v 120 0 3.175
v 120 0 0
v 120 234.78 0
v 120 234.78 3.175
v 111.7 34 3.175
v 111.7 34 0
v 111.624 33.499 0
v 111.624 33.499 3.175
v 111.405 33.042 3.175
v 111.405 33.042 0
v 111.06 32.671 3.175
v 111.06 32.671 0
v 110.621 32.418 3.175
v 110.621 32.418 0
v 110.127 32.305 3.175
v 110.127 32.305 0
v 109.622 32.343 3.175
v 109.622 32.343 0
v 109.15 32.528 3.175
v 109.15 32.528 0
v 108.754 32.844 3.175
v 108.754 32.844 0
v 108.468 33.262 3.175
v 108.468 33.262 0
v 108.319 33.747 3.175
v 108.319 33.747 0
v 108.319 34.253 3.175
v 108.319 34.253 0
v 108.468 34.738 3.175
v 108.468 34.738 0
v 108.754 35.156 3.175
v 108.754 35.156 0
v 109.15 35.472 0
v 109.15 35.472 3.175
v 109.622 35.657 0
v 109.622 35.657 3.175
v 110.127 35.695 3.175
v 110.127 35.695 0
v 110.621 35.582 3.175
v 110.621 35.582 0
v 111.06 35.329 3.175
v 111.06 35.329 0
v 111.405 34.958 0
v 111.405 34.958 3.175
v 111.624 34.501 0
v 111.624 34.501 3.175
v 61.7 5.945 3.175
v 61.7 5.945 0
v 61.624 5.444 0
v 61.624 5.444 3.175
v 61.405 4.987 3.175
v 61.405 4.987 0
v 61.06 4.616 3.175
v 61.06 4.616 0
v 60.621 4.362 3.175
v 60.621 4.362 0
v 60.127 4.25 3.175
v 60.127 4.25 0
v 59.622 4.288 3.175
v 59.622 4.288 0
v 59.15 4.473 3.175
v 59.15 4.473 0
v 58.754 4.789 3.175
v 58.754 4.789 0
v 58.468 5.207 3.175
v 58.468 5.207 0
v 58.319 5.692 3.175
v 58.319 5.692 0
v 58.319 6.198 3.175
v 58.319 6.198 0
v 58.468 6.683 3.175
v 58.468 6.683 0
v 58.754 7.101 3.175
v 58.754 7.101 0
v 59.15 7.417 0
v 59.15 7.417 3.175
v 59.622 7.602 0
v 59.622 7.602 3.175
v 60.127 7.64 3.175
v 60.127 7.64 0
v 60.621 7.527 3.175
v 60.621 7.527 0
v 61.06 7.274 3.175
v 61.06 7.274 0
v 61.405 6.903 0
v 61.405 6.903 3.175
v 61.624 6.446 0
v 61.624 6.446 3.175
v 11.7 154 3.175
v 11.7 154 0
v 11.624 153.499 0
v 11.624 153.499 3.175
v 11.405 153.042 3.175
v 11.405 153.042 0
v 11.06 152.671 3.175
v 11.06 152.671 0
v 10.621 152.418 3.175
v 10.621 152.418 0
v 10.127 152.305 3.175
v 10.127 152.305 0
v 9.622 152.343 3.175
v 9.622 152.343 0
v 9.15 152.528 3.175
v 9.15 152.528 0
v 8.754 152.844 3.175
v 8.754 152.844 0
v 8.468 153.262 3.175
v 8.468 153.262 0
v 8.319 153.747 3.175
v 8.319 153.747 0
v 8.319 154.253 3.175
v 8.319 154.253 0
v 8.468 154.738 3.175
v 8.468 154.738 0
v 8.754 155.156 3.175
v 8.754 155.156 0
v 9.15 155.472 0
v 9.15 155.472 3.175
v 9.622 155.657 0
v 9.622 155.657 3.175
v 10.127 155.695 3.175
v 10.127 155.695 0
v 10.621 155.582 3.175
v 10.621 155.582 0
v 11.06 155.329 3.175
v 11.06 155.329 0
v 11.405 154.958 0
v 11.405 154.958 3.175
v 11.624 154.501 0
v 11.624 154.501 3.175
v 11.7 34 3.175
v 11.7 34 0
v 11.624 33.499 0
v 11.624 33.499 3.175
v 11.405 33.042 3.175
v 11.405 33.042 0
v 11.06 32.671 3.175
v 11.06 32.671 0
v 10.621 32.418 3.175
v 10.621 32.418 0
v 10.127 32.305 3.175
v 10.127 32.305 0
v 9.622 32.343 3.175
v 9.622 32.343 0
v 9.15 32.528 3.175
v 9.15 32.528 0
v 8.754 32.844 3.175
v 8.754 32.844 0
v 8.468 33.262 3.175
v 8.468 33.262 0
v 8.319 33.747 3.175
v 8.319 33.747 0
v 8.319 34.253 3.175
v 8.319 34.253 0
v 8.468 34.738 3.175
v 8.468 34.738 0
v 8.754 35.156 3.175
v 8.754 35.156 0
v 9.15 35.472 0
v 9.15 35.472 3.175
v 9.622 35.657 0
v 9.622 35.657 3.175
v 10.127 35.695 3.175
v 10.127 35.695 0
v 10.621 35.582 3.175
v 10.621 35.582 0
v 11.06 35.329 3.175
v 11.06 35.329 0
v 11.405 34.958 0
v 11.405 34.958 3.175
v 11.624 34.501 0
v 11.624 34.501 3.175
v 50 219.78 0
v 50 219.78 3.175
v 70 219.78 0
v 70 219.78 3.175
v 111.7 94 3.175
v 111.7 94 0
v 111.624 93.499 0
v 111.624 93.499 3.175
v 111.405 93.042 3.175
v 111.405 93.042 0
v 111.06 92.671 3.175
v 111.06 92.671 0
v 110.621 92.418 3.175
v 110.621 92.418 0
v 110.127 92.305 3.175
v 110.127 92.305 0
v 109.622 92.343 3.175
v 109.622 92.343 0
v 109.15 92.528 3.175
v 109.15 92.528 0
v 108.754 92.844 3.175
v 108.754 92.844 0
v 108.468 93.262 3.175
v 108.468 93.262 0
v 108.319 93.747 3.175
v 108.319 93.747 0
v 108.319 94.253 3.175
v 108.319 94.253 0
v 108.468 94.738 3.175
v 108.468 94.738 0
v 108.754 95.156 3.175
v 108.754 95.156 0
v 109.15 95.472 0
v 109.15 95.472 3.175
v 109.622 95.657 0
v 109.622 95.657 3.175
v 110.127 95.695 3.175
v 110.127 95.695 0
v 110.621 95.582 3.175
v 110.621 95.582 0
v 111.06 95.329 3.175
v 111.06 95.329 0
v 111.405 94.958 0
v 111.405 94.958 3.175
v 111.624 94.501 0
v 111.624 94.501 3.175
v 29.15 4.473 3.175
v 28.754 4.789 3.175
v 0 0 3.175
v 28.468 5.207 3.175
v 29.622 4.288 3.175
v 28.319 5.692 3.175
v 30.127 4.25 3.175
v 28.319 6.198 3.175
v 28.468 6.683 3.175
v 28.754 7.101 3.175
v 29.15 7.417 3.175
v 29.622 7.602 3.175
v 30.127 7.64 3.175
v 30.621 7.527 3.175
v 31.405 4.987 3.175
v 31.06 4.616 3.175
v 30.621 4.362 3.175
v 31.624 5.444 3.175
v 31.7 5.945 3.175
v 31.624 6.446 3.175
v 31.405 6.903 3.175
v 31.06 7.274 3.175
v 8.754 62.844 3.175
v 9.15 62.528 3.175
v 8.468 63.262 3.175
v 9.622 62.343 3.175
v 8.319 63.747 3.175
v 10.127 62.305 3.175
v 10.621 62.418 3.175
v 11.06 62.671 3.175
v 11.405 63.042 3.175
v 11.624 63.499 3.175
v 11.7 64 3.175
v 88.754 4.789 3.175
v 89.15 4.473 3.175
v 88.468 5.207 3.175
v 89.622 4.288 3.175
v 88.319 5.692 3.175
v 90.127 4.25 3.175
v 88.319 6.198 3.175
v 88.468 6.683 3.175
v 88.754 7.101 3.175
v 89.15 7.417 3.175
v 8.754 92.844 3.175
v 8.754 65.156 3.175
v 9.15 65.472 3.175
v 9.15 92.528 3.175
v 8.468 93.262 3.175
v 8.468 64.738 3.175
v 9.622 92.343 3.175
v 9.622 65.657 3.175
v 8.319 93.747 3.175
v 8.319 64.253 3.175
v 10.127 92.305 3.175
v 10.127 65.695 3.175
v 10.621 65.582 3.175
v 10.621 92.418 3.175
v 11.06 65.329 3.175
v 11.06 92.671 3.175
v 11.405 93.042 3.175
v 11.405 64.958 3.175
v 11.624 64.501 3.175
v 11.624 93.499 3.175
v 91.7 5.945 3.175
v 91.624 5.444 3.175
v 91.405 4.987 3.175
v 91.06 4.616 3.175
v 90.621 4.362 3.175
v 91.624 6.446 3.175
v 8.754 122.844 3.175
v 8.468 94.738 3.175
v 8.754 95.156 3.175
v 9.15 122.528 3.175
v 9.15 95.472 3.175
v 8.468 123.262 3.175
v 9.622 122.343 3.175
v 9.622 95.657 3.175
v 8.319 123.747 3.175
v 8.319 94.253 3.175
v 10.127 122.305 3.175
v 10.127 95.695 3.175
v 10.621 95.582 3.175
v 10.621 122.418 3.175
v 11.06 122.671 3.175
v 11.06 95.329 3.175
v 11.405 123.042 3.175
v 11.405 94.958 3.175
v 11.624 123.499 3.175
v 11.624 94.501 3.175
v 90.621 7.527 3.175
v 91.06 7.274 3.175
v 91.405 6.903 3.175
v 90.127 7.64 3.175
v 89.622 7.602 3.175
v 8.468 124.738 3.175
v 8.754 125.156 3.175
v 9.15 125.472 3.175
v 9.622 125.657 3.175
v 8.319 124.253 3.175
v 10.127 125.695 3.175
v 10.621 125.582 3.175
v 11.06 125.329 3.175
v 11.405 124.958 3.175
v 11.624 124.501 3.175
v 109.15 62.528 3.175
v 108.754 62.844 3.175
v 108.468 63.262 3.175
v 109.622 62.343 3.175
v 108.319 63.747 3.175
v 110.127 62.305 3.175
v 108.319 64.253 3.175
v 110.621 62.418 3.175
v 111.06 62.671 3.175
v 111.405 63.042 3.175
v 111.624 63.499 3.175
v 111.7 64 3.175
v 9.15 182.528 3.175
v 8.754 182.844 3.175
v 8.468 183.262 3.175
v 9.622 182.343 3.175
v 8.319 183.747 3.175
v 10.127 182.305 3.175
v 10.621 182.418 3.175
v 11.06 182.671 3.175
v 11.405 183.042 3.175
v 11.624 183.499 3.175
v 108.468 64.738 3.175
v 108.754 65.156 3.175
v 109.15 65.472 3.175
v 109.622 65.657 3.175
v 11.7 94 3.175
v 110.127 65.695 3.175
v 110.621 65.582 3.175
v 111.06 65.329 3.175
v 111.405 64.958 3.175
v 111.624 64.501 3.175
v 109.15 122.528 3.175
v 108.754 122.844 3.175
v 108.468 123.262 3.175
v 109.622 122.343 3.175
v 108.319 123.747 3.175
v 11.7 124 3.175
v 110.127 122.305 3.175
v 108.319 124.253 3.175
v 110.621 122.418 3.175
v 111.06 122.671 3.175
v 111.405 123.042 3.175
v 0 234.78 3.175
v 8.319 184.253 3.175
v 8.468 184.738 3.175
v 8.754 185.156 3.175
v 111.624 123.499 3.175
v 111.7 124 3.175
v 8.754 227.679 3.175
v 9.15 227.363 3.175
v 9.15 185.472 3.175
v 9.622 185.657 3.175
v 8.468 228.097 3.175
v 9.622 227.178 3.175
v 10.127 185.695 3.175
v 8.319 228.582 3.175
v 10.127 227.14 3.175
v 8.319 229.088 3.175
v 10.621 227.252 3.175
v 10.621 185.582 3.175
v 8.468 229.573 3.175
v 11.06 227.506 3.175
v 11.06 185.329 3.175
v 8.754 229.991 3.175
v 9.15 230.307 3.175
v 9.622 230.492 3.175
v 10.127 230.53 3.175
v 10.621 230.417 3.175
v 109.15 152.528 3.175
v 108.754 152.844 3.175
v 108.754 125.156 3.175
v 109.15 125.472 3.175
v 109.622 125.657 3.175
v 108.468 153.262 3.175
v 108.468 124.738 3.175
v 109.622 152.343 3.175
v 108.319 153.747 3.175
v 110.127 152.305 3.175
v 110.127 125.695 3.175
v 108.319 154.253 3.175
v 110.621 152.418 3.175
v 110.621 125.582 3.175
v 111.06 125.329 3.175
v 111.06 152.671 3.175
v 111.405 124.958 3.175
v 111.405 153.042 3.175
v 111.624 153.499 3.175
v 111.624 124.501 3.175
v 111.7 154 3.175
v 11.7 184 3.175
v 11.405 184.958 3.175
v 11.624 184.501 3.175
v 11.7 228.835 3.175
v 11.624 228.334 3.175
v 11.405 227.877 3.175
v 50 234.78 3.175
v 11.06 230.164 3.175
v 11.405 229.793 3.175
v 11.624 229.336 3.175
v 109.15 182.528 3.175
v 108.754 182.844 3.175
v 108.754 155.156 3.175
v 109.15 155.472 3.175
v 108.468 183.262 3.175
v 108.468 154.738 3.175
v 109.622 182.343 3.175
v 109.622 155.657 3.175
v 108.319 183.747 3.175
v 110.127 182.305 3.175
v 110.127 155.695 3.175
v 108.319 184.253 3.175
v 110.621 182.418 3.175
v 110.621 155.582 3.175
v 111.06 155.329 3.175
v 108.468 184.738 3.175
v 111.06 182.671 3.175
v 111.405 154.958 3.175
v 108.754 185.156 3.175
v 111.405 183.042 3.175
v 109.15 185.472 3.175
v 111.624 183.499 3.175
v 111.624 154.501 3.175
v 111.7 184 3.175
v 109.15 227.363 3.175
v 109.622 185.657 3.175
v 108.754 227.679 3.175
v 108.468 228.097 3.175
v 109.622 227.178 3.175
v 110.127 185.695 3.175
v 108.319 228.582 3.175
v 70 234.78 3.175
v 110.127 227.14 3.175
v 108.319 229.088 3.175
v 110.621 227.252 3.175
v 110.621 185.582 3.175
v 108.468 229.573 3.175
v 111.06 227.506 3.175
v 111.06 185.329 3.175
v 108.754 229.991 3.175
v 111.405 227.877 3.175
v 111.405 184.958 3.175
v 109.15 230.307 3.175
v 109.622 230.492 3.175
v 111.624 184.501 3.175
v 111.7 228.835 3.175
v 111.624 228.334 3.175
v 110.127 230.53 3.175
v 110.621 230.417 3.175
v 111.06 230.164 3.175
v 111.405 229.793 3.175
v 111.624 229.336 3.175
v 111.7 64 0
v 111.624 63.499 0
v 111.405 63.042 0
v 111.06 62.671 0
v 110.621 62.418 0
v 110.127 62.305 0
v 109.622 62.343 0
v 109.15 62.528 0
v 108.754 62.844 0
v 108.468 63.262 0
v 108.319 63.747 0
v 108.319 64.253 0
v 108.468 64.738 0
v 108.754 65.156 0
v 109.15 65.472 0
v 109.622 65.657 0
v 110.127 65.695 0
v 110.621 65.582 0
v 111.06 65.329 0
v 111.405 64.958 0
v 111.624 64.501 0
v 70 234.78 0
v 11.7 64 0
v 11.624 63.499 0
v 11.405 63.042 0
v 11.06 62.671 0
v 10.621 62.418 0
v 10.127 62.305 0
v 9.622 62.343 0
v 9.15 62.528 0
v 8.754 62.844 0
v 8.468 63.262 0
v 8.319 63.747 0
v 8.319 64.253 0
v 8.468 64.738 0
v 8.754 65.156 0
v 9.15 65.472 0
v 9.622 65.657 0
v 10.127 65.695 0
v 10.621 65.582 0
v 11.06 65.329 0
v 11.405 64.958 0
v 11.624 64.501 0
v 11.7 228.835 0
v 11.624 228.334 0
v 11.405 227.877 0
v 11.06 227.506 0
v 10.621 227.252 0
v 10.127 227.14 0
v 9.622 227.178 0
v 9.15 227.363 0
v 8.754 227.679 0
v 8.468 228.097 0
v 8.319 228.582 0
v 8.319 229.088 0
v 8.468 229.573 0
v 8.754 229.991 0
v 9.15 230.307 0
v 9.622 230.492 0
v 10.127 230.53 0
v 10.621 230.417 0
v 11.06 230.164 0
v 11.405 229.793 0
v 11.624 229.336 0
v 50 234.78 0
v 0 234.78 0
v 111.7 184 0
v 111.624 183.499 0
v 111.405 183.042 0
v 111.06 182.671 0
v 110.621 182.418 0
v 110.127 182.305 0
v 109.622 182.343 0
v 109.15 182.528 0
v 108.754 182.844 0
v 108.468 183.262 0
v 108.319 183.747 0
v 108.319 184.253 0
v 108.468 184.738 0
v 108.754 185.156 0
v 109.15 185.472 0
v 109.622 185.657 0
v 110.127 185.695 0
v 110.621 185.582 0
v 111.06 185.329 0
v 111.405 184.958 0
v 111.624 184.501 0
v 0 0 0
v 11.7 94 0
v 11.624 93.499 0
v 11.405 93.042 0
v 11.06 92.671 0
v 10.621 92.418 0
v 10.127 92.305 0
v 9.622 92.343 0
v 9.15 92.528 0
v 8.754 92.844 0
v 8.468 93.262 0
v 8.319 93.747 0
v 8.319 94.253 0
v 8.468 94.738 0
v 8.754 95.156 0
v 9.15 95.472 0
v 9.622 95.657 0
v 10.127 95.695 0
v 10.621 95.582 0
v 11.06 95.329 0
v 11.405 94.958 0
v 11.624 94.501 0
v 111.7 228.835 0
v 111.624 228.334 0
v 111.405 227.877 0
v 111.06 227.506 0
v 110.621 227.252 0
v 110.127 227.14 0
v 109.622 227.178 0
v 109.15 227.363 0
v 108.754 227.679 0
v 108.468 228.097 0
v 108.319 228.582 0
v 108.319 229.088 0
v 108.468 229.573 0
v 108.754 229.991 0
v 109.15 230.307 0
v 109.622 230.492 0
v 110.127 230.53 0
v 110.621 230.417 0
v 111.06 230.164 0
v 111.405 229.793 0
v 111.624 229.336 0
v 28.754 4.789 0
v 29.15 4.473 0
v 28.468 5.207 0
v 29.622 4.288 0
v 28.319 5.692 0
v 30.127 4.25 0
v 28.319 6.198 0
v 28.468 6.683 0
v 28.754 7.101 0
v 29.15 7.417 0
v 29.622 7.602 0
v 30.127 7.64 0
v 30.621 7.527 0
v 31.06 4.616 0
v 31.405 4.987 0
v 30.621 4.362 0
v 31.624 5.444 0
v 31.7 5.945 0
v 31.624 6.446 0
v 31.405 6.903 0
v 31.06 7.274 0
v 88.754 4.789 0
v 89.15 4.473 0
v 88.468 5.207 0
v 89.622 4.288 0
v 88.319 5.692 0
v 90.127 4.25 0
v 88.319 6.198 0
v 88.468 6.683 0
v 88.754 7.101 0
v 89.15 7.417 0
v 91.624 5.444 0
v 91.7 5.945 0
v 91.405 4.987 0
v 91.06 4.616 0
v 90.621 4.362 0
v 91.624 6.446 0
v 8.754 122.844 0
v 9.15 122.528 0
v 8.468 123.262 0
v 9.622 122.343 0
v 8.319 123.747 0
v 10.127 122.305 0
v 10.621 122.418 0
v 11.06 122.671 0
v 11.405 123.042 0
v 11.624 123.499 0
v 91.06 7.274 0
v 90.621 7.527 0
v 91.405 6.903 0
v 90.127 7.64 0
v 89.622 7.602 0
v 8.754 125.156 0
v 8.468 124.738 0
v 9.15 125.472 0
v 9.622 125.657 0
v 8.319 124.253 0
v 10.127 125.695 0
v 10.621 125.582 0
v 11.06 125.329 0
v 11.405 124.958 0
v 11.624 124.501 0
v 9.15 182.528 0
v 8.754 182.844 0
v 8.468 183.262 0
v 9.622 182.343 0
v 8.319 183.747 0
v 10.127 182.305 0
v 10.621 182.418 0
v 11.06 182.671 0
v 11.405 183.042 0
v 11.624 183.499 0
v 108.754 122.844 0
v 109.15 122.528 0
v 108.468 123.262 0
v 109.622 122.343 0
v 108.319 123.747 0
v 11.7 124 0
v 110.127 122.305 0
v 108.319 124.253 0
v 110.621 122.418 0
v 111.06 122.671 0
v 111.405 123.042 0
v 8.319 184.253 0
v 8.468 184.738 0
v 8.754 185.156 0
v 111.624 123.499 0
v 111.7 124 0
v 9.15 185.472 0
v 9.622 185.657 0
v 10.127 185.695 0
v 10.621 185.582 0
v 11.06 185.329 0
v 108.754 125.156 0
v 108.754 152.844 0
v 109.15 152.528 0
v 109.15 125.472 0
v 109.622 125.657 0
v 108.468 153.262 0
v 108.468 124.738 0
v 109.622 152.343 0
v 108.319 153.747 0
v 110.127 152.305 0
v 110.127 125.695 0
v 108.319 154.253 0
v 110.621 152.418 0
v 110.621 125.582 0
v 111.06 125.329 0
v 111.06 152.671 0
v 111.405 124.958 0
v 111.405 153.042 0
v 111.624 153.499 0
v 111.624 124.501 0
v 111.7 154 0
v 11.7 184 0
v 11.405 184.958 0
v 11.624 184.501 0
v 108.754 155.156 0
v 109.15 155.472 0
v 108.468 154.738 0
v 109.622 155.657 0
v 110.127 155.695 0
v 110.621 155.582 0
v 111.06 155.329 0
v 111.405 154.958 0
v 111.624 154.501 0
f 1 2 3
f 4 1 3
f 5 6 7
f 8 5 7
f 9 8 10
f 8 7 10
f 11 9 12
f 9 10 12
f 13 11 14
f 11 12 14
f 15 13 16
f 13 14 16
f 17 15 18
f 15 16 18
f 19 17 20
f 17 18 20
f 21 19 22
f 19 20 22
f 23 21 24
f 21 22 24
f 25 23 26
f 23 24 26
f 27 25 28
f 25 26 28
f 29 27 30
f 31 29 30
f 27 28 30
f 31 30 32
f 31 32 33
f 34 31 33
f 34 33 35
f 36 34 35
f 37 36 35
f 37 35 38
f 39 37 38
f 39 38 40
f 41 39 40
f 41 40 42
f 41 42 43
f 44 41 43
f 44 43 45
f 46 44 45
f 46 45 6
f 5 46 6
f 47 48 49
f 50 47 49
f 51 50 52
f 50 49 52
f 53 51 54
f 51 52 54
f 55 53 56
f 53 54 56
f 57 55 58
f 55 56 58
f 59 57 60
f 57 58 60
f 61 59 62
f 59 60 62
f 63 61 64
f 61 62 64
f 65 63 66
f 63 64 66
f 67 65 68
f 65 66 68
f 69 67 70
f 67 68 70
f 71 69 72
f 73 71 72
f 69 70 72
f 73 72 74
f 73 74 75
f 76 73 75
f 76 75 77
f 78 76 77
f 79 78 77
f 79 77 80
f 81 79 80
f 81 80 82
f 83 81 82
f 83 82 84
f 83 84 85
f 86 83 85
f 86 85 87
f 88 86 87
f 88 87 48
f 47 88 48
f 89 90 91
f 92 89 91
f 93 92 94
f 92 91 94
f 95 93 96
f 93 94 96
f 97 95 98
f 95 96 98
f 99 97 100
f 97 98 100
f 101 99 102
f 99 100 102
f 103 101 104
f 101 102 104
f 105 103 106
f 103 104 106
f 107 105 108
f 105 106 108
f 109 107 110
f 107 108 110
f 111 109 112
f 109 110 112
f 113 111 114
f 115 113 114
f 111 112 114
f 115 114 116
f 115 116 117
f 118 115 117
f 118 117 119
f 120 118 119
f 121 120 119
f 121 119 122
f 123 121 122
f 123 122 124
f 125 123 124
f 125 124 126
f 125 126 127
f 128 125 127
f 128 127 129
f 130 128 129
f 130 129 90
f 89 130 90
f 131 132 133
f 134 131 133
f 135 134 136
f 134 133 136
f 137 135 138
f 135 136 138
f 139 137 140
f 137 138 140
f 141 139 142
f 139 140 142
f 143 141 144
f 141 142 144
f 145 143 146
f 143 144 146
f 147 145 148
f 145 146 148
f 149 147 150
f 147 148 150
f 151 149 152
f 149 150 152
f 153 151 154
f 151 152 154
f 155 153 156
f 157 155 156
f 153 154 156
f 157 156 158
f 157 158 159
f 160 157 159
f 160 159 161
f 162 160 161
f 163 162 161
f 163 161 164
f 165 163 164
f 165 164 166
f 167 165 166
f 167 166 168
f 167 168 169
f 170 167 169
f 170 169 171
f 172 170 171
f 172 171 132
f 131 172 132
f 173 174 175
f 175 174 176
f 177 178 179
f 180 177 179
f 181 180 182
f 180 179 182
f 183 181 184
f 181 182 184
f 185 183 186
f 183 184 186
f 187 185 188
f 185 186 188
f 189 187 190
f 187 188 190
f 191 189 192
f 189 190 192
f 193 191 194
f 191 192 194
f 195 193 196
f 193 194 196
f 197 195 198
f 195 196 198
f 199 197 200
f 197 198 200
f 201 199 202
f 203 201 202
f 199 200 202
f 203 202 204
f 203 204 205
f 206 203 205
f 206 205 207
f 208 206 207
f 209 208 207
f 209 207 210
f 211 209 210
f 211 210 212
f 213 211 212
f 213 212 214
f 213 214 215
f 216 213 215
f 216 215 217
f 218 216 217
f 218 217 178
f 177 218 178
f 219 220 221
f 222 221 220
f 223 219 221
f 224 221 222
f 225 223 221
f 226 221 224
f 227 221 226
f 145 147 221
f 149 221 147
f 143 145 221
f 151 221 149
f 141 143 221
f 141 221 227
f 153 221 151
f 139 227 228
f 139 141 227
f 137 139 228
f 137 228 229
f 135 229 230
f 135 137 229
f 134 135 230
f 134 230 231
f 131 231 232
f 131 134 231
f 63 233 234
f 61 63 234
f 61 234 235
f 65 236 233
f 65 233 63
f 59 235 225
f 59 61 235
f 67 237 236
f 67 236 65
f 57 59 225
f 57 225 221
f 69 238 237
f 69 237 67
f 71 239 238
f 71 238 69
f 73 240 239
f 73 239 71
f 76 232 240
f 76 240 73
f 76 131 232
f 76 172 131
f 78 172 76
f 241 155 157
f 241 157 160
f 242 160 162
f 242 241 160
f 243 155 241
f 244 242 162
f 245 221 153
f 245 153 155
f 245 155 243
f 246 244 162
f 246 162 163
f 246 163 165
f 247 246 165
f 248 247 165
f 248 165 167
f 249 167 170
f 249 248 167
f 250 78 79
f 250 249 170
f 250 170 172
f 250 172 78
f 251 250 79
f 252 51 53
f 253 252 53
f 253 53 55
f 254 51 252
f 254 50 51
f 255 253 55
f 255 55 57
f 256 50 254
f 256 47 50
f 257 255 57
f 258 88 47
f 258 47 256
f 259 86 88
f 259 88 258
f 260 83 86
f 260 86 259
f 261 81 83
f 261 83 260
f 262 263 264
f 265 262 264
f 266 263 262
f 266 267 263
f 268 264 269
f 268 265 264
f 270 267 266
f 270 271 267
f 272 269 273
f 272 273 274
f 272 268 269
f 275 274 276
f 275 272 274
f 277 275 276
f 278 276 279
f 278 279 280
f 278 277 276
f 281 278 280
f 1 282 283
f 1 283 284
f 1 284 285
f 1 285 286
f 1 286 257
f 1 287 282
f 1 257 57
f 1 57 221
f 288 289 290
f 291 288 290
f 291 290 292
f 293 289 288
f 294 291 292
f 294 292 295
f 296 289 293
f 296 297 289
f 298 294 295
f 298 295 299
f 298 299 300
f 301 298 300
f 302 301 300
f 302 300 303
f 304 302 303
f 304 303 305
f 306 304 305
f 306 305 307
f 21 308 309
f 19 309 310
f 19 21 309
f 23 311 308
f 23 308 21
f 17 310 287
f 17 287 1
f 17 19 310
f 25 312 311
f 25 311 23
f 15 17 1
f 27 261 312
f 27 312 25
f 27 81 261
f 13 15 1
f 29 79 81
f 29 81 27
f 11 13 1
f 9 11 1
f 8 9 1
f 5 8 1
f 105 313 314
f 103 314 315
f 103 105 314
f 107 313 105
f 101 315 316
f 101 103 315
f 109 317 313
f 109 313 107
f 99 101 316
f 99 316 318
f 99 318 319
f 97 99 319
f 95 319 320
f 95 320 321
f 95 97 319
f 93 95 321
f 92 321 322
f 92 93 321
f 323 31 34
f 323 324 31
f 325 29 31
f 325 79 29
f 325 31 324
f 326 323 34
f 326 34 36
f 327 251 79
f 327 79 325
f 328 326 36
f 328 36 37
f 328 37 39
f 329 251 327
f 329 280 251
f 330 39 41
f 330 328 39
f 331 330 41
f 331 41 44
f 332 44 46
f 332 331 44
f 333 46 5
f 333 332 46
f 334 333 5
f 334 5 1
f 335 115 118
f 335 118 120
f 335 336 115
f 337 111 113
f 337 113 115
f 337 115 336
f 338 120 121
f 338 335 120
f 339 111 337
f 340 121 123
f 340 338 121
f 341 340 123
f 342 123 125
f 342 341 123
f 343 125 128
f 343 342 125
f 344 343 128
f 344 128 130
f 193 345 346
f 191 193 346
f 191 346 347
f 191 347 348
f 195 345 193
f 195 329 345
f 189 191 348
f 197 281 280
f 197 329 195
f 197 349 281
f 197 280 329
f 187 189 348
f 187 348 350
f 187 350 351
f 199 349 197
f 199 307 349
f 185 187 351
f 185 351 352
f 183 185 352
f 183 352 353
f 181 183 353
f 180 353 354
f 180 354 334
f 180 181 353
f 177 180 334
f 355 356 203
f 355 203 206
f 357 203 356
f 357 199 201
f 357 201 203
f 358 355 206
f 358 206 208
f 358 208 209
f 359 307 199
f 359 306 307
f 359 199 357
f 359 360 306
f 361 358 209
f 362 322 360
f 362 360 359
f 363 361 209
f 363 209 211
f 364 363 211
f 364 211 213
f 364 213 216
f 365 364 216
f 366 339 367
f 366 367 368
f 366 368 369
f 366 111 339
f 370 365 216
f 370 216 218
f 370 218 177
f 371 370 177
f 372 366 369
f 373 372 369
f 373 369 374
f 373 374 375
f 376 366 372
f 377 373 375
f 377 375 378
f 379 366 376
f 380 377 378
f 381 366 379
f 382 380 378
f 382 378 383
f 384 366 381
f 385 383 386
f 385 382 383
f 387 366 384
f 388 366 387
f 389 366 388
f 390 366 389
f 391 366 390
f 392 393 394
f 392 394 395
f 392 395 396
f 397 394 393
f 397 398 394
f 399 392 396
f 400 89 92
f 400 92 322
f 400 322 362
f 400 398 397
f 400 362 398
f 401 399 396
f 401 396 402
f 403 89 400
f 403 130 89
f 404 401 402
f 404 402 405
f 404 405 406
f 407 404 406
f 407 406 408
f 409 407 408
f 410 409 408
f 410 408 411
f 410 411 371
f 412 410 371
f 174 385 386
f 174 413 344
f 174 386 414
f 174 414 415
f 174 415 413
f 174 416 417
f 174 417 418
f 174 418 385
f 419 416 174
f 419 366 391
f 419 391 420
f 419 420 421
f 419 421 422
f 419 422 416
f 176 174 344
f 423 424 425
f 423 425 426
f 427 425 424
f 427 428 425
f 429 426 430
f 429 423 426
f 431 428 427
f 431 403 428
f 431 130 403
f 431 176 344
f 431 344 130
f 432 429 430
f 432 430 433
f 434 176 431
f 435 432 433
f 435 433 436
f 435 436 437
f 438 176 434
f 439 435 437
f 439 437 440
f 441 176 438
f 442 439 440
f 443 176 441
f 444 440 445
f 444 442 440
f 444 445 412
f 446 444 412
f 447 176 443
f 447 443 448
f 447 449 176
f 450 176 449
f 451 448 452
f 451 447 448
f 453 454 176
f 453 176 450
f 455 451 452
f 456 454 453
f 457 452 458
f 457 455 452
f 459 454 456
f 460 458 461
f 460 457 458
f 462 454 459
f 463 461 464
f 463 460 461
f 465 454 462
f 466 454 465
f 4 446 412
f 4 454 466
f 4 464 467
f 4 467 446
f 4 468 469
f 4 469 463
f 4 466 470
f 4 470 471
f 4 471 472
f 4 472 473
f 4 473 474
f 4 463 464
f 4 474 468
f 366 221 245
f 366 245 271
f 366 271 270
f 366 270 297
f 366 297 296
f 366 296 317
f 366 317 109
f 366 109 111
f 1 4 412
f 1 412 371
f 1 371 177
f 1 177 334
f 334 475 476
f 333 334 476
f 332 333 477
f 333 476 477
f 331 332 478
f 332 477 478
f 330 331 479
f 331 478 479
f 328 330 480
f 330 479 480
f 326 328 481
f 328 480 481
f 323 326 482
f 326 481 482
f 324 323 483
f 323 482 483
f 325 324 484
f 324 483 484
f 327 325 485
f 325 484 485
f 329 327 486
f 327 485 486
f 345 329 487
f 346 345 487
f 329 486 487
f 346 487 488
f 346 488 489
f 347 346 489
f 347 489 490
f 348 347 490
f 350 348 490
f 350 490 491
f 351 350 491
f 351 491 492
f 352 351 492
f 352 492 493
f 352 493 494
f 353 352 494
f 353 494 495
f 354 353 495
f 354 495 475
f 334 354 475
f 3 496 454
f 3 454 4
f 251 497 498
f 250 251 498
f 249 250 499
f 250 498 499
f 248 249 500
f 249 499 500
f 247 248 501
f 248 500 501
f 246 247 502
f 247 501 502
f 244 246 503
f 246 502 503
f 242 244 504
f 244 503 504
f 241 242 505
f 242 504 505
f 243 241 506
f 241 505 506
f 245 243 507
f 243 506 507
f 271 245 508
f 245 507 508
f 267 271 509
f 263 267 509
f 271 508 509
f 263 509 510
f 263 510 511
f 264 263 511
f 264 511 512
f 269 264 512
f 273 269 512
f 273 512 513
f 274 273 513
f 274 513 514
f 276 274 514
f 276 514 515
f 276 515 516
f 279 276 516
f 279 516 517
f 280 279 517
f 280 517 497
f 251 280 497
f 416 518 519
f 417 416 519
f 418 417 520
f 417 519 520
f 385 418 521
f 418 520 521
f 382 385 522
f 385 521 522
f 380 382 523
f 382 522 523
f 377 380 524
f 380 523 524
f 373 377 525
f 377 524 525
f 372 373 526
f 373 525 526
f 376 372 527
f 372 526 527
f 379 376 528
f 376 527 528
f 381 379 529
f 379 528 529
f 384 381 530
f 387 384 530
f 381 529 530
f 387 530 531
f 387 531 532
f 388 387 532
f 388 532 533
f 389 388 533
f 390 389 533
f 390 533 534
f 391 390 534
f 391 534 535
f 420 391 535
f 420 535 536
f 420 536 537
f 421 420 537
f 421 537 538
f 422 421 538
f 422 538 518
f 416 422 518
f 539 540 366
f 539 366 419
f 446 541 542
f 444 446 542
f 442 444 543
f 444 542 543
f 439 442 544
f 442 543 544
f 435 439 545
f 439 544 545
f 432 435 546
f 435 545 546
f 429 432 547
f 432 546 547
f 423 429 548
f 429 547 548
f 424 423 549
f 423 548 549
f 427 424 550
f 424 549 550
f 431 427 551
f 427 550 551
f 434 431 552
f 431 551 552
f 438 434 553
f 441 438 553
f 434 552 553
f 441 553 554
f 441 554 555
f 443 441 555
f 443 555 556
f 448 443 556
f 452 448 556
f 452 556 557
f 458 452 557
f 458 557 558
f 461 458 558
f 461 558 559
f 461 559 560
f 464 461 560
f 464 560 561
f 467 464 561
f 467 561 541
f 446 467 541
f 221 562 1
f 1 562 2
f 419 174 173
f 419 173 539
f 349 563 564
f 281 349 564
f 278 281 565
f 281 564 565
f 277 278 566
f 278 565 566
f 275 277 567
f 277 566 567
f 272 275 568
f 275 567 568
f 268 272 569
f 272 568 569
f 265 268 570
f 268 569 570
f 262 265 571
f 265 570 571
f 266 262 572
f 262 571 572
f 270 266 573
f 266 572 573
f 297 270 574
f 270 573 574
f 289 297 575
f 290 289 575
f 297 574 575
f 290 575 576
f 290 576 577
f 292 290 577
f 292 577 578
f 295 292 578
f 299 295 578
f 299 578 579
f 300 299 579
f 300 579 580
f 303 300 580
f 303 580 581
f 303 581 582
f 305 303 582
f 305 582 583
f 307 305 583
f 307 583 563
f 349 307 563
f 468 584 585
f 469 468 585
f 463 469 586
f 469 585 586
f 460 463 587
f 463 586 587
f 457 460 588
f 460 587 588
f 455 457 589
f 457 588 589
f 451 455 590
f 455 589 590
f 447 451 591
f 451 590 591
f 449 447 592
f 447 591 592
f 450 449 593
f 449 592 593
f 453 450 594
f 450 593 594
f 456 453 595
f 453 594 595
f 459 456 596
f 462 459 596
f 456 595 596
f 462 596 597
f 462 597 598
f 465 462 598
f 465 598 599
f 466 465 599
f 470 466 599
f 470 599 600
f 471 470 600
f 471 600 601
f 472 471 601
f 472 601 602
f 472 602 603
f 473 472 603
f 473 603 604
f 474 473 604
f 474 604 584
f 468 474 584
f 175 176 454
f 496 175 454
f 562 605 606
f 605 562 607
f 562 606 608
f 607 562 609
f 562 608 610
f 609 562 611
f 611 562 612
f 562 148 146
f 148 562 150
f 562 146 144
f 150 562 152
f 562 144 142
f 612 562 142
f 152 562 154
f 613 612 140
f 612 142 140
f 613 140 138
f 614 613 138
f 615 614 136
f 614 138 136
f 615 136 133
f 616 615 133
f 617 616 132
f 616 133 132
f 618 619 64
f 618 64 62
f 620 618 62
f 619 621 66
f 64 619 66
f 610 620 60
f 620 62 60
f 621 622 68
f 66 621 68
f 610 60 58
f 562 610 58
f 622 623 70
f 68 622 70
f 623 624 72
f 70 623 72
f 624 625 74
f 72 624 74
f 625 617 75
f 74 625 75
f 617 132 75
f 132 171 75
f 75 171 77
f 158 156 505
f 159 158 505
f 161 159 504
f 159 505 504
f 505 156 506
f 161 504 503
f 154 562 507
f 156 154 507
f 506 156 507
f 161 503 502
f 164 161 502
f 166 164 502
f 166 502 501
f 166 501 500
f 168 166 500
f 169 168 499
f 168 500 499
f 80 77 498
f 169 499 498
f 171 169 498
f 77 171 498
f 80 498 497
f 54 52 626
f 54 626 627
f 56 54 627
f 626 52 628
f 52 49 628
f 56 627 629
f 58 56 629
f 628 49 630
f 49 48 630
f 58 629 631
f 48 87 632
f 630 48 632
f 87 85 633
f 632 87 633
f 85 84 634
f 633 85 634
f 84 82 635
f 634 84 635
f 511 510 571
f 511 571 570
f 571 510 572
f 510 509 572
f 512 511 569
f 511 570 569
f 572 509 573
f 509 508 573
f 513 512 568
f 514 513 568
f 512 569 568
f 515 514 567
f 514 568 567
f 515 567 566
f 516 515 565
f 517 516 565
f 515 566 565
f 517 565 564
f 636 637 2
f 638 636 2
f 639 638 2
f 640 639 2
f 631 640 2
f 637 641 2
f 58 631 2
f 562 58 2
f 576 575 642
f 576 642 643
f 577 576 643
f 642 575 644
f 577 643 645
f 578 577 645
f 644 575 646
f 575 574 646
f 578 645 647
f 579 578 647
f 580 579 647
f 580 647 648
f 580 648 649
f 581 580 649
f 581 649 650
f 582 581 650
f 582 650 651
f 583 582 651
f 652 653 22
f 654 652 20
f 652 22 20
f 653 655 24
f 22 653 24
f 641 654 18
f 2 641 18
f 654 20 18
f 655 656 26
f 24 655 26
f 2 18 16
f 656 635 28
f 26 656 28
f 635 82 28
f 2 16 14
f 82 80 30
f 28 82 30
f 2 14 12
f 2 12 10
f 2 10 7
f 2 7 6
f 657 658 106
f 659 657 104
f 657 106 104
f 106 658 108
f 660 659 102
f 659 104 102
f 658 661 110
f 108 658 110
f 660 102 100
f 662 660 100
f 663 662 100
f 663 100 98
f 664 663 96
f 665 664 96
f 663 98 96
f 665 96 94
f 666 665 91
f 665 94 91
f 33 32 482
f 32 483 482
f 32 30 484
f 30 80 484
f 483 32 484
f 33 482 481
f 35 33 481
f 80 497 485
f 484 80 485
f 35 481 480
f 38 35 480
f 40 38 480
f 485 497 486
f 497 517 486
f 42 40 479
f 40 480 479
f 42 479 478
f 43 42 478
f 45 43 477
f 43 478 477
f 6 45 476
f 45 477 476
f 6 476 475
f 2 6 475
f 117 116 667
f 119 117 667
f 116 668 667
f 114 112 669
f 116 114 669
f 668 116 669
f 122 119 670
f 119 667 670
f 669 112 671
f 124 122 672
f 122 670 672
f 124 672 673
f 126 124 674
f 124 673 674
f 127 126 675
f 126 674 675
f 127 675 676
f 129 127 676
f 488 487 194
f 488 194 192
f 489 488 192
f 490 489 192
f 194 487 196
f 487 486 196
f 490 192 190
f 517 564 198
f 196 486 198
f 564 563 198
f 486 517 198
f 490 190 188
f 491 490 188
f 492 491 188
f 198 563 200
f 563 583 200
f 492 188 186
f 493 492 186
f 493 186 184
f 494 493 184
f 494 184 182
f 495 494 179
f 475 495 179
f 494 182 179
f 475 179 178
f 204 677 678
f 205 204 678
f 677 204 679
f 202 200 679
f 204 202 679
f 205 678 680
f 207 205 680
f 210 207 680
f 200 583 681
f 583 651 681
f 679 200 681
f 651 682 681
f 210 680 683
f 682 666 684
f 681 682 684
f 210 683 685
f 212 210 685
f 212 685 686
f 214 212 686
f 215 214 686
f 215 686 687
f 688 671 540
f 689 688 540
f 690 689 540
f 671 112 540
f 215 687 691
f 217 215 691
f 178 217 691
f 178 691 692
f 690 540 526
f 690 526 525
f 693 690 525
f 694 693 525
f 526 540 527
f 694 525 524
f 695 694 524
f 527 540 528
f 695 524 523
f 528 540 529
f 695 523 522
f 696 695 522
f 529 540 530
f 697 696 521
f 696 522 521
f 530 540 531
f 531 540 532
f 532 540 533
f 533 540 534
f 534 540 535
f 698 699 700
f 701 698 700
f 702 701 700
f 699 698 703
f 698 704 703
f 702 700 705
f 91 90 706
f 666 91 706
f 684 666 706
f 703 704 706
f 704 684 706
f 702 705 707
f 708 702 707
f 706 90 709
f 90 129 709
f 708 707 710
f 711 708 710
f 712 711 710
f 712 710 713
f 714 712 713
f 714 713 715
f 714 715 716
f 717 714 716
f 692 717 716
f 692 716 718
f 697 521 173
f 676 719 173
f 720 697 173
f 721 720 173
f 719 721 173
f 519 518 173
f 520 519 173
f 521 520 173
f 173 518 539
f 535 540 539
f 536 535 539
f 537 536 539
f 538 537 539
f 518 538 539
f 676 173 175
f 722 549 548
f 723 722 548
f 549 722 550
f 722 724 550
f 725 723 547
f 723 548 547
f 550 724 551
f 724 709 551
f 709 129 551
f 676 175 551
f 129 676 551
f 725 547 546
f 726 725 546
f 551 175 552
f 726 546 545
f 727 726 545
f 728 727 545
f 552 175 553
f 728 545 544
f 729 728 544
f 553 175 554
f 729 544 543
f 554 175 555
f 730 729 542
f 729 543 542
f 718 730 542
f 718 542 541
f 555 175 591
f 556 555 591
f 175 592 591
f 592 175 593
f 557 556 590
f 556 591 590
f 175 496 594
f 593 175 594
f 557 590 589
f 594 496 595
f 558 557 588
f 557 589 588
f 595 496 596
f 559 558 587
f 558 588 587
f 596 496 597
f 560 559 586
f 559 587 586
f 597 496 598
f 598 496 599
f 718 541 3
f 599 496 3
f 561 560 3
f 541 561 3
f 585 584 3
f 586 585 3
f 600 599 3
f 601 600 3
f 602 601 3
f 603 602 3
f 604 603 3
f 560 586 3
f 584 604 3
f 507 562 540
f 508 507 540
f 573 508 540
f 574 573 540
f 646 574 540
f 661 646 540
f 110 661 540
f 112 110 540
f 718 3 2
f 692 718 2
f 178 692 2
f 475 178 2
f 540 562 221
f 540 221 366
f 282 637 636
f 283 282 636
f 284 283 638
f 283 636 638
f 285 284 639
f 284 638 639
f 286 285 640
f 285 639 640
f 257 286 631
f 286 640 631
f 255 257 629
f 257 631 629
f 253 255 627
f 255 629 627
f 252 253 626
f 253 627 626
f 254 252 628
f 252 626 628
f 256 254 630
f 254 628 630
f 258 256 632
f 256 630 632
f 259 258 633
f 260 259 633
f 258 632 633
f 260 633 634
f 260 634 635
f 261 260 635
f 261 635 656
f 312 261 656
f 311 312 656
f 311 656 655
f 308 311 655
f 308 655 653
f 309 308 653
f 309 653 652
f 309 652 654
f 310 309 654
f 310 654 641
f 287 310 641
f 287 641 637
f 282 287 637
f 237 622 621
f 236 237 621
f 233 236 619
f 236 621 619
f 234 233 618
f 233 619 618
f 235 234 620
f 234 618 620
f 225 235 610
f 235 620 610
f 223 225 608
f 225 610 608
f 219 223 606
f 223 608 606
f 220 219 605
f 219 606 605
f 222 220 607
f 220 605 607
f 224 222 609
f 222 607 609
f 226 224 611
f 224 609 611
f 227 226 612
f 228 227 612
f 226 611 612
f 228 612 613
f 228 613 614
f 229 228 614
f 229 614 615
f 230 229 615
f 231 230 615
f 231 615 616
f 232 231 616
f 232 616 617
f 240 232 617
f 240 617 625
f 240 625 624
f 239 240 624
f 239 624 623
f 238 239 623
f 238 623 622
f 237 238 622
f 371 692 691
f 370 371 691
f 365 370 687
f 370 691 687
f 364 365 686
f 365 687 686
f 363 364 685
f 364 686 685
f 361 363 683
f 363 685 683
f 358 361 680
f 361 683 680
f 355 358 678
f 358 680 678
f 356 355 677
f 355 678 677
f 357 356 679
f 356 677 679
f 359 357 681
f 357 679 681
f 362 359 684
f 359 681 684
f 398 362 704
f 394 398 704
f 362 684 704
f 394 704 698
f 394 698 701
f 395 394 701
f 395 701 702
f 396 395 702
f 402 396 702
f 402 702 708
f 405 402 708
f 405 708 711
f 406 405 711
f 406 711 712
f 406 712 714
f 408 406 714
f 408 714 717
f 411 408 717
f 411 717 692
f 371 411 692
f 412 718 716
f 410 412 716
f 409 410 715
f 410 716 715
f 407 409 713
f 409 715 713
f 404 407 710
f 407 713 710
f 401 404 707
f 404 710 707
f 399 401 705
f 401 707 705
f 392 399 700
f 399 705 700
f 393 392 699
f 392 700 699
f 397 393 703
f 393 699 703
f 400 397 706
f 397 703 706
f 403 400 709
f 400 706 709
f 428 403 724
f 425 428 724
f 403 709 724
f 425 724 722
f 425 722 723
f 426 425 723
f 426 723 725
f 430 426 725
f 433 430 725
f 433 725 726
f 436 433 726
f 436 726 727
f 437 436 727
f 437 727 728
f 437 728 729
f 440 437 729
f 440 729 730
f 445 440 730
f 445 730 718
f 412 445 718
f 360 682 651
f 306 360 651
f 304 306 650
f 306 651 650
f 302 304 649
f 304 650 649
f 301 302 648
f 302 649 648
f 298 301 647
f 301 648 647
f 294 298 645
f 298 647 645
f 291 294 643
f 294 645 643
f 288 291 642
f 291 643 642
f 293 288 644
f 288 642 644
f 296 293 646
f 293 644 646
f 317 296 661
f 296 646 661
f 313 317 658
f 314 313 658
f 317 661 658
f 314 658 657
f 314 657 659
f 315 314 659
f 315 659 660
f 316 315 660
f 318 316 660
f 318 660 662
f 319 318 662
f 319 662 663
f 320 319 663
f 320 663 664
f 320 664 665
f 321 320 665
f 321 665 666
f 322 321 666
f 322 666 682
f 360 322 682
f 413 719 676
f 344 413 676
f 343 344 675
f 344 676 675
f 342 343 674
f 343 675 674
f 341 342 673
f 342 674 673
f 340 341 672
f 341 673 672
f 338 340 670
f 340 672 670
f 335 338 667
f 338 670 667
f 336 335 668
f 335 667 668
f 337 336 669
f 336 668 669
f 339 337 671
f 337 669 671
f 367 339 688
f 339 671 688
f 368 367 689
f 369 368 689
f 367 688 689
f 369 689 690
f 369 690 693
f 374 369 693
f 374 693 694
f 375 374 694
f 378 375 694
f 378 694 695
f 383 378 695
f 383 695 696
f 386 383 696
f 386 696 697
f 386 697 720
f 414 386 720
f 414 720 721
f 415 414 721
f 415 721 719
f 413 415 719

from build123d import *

# Parameters (mm, degrees)
SKETCH1_W                       = 120
SKETCH1_H                       = 234.78
BOSS_EXTRUDE1_DEPTH             = 3.175
CUT_EXTRUDE1_REACH              = 5.175
SKETCH2_W                       = 20
SKETCH2_H                       = 15
TAP_DRILL_FOR_M3X0_5_TAP1_D     = 3.4
TAP_DRILL_FOR_M3X0_5_TAP1_DEPTH = 3.18


with BuildPart() as part:
    # Sketch1 → Boss-Extrude1 (new body)
    with BuildSketch(Plane.XY):
        with Locations((60, 117.39)):
            Rectangle(SKETCH1_W, SKETCH1_H)
    extrude(amount=BOSS_EXTRUDE1_DEPTH)

    # Sketch2 → Cut-Extrude1 (cut, up to next)
    with BuildSketch(Plane.XY.offset(3.175), mode=Mode.PRIVATE) as cut_extrude1_sk1:
        with Locations((60, 227.28)):
            Rectangle(SKETCH2_W, SKETCH2_H)
    cut_extrude1_tool1 = extrude(cut_extrude1_sk1.sketch, amount=-CUT_EXTRUDE1_REACH, mode=Mode.PRIVATE) & part.part
    add(cut_extrude1_tool1.solids().sort_by_distance((60, 227.28, 3.175))[0], mode=Mode.SUBTRACT)

    # Tap Drill for M3x0.5 Tap1
    with Locations(Plane(origin=(42.952239605, 18.521605689, 3.175), x_dir=(-1, 0, 0), z_dir=(0, 0, 1))):
        with Locations((32.952239605, -210.31329226), (32.952239605, -165.478394311), (32.952239605, -105.478394311), (32.952239605, -75.478394311), (32.952239605, -45.478394311), (32.952239605, -15.478394311), (-67.047760395, -210.31329226), (32.952239605, -135.478394311), (12.952239605, 12.57670774), (-17.047760395, 12.57670774), (-47.047760395, 12.57670774), (-67.047760395, -165.478394311), (-67.047760395, -135.478394311), (-67.047760395, -105.478394311), (-67.047760395, -75.478394311), (-67.047760395, -45.478394311), (-67.047760395, -15.478394311)):
            Hole(TAP_DRILL_FOR_M3X0_5_TAP1_D / 2, depth=TAP_DRILL_FOR_M3X0_5_TAP1_DEPTH)


solid = part.part
